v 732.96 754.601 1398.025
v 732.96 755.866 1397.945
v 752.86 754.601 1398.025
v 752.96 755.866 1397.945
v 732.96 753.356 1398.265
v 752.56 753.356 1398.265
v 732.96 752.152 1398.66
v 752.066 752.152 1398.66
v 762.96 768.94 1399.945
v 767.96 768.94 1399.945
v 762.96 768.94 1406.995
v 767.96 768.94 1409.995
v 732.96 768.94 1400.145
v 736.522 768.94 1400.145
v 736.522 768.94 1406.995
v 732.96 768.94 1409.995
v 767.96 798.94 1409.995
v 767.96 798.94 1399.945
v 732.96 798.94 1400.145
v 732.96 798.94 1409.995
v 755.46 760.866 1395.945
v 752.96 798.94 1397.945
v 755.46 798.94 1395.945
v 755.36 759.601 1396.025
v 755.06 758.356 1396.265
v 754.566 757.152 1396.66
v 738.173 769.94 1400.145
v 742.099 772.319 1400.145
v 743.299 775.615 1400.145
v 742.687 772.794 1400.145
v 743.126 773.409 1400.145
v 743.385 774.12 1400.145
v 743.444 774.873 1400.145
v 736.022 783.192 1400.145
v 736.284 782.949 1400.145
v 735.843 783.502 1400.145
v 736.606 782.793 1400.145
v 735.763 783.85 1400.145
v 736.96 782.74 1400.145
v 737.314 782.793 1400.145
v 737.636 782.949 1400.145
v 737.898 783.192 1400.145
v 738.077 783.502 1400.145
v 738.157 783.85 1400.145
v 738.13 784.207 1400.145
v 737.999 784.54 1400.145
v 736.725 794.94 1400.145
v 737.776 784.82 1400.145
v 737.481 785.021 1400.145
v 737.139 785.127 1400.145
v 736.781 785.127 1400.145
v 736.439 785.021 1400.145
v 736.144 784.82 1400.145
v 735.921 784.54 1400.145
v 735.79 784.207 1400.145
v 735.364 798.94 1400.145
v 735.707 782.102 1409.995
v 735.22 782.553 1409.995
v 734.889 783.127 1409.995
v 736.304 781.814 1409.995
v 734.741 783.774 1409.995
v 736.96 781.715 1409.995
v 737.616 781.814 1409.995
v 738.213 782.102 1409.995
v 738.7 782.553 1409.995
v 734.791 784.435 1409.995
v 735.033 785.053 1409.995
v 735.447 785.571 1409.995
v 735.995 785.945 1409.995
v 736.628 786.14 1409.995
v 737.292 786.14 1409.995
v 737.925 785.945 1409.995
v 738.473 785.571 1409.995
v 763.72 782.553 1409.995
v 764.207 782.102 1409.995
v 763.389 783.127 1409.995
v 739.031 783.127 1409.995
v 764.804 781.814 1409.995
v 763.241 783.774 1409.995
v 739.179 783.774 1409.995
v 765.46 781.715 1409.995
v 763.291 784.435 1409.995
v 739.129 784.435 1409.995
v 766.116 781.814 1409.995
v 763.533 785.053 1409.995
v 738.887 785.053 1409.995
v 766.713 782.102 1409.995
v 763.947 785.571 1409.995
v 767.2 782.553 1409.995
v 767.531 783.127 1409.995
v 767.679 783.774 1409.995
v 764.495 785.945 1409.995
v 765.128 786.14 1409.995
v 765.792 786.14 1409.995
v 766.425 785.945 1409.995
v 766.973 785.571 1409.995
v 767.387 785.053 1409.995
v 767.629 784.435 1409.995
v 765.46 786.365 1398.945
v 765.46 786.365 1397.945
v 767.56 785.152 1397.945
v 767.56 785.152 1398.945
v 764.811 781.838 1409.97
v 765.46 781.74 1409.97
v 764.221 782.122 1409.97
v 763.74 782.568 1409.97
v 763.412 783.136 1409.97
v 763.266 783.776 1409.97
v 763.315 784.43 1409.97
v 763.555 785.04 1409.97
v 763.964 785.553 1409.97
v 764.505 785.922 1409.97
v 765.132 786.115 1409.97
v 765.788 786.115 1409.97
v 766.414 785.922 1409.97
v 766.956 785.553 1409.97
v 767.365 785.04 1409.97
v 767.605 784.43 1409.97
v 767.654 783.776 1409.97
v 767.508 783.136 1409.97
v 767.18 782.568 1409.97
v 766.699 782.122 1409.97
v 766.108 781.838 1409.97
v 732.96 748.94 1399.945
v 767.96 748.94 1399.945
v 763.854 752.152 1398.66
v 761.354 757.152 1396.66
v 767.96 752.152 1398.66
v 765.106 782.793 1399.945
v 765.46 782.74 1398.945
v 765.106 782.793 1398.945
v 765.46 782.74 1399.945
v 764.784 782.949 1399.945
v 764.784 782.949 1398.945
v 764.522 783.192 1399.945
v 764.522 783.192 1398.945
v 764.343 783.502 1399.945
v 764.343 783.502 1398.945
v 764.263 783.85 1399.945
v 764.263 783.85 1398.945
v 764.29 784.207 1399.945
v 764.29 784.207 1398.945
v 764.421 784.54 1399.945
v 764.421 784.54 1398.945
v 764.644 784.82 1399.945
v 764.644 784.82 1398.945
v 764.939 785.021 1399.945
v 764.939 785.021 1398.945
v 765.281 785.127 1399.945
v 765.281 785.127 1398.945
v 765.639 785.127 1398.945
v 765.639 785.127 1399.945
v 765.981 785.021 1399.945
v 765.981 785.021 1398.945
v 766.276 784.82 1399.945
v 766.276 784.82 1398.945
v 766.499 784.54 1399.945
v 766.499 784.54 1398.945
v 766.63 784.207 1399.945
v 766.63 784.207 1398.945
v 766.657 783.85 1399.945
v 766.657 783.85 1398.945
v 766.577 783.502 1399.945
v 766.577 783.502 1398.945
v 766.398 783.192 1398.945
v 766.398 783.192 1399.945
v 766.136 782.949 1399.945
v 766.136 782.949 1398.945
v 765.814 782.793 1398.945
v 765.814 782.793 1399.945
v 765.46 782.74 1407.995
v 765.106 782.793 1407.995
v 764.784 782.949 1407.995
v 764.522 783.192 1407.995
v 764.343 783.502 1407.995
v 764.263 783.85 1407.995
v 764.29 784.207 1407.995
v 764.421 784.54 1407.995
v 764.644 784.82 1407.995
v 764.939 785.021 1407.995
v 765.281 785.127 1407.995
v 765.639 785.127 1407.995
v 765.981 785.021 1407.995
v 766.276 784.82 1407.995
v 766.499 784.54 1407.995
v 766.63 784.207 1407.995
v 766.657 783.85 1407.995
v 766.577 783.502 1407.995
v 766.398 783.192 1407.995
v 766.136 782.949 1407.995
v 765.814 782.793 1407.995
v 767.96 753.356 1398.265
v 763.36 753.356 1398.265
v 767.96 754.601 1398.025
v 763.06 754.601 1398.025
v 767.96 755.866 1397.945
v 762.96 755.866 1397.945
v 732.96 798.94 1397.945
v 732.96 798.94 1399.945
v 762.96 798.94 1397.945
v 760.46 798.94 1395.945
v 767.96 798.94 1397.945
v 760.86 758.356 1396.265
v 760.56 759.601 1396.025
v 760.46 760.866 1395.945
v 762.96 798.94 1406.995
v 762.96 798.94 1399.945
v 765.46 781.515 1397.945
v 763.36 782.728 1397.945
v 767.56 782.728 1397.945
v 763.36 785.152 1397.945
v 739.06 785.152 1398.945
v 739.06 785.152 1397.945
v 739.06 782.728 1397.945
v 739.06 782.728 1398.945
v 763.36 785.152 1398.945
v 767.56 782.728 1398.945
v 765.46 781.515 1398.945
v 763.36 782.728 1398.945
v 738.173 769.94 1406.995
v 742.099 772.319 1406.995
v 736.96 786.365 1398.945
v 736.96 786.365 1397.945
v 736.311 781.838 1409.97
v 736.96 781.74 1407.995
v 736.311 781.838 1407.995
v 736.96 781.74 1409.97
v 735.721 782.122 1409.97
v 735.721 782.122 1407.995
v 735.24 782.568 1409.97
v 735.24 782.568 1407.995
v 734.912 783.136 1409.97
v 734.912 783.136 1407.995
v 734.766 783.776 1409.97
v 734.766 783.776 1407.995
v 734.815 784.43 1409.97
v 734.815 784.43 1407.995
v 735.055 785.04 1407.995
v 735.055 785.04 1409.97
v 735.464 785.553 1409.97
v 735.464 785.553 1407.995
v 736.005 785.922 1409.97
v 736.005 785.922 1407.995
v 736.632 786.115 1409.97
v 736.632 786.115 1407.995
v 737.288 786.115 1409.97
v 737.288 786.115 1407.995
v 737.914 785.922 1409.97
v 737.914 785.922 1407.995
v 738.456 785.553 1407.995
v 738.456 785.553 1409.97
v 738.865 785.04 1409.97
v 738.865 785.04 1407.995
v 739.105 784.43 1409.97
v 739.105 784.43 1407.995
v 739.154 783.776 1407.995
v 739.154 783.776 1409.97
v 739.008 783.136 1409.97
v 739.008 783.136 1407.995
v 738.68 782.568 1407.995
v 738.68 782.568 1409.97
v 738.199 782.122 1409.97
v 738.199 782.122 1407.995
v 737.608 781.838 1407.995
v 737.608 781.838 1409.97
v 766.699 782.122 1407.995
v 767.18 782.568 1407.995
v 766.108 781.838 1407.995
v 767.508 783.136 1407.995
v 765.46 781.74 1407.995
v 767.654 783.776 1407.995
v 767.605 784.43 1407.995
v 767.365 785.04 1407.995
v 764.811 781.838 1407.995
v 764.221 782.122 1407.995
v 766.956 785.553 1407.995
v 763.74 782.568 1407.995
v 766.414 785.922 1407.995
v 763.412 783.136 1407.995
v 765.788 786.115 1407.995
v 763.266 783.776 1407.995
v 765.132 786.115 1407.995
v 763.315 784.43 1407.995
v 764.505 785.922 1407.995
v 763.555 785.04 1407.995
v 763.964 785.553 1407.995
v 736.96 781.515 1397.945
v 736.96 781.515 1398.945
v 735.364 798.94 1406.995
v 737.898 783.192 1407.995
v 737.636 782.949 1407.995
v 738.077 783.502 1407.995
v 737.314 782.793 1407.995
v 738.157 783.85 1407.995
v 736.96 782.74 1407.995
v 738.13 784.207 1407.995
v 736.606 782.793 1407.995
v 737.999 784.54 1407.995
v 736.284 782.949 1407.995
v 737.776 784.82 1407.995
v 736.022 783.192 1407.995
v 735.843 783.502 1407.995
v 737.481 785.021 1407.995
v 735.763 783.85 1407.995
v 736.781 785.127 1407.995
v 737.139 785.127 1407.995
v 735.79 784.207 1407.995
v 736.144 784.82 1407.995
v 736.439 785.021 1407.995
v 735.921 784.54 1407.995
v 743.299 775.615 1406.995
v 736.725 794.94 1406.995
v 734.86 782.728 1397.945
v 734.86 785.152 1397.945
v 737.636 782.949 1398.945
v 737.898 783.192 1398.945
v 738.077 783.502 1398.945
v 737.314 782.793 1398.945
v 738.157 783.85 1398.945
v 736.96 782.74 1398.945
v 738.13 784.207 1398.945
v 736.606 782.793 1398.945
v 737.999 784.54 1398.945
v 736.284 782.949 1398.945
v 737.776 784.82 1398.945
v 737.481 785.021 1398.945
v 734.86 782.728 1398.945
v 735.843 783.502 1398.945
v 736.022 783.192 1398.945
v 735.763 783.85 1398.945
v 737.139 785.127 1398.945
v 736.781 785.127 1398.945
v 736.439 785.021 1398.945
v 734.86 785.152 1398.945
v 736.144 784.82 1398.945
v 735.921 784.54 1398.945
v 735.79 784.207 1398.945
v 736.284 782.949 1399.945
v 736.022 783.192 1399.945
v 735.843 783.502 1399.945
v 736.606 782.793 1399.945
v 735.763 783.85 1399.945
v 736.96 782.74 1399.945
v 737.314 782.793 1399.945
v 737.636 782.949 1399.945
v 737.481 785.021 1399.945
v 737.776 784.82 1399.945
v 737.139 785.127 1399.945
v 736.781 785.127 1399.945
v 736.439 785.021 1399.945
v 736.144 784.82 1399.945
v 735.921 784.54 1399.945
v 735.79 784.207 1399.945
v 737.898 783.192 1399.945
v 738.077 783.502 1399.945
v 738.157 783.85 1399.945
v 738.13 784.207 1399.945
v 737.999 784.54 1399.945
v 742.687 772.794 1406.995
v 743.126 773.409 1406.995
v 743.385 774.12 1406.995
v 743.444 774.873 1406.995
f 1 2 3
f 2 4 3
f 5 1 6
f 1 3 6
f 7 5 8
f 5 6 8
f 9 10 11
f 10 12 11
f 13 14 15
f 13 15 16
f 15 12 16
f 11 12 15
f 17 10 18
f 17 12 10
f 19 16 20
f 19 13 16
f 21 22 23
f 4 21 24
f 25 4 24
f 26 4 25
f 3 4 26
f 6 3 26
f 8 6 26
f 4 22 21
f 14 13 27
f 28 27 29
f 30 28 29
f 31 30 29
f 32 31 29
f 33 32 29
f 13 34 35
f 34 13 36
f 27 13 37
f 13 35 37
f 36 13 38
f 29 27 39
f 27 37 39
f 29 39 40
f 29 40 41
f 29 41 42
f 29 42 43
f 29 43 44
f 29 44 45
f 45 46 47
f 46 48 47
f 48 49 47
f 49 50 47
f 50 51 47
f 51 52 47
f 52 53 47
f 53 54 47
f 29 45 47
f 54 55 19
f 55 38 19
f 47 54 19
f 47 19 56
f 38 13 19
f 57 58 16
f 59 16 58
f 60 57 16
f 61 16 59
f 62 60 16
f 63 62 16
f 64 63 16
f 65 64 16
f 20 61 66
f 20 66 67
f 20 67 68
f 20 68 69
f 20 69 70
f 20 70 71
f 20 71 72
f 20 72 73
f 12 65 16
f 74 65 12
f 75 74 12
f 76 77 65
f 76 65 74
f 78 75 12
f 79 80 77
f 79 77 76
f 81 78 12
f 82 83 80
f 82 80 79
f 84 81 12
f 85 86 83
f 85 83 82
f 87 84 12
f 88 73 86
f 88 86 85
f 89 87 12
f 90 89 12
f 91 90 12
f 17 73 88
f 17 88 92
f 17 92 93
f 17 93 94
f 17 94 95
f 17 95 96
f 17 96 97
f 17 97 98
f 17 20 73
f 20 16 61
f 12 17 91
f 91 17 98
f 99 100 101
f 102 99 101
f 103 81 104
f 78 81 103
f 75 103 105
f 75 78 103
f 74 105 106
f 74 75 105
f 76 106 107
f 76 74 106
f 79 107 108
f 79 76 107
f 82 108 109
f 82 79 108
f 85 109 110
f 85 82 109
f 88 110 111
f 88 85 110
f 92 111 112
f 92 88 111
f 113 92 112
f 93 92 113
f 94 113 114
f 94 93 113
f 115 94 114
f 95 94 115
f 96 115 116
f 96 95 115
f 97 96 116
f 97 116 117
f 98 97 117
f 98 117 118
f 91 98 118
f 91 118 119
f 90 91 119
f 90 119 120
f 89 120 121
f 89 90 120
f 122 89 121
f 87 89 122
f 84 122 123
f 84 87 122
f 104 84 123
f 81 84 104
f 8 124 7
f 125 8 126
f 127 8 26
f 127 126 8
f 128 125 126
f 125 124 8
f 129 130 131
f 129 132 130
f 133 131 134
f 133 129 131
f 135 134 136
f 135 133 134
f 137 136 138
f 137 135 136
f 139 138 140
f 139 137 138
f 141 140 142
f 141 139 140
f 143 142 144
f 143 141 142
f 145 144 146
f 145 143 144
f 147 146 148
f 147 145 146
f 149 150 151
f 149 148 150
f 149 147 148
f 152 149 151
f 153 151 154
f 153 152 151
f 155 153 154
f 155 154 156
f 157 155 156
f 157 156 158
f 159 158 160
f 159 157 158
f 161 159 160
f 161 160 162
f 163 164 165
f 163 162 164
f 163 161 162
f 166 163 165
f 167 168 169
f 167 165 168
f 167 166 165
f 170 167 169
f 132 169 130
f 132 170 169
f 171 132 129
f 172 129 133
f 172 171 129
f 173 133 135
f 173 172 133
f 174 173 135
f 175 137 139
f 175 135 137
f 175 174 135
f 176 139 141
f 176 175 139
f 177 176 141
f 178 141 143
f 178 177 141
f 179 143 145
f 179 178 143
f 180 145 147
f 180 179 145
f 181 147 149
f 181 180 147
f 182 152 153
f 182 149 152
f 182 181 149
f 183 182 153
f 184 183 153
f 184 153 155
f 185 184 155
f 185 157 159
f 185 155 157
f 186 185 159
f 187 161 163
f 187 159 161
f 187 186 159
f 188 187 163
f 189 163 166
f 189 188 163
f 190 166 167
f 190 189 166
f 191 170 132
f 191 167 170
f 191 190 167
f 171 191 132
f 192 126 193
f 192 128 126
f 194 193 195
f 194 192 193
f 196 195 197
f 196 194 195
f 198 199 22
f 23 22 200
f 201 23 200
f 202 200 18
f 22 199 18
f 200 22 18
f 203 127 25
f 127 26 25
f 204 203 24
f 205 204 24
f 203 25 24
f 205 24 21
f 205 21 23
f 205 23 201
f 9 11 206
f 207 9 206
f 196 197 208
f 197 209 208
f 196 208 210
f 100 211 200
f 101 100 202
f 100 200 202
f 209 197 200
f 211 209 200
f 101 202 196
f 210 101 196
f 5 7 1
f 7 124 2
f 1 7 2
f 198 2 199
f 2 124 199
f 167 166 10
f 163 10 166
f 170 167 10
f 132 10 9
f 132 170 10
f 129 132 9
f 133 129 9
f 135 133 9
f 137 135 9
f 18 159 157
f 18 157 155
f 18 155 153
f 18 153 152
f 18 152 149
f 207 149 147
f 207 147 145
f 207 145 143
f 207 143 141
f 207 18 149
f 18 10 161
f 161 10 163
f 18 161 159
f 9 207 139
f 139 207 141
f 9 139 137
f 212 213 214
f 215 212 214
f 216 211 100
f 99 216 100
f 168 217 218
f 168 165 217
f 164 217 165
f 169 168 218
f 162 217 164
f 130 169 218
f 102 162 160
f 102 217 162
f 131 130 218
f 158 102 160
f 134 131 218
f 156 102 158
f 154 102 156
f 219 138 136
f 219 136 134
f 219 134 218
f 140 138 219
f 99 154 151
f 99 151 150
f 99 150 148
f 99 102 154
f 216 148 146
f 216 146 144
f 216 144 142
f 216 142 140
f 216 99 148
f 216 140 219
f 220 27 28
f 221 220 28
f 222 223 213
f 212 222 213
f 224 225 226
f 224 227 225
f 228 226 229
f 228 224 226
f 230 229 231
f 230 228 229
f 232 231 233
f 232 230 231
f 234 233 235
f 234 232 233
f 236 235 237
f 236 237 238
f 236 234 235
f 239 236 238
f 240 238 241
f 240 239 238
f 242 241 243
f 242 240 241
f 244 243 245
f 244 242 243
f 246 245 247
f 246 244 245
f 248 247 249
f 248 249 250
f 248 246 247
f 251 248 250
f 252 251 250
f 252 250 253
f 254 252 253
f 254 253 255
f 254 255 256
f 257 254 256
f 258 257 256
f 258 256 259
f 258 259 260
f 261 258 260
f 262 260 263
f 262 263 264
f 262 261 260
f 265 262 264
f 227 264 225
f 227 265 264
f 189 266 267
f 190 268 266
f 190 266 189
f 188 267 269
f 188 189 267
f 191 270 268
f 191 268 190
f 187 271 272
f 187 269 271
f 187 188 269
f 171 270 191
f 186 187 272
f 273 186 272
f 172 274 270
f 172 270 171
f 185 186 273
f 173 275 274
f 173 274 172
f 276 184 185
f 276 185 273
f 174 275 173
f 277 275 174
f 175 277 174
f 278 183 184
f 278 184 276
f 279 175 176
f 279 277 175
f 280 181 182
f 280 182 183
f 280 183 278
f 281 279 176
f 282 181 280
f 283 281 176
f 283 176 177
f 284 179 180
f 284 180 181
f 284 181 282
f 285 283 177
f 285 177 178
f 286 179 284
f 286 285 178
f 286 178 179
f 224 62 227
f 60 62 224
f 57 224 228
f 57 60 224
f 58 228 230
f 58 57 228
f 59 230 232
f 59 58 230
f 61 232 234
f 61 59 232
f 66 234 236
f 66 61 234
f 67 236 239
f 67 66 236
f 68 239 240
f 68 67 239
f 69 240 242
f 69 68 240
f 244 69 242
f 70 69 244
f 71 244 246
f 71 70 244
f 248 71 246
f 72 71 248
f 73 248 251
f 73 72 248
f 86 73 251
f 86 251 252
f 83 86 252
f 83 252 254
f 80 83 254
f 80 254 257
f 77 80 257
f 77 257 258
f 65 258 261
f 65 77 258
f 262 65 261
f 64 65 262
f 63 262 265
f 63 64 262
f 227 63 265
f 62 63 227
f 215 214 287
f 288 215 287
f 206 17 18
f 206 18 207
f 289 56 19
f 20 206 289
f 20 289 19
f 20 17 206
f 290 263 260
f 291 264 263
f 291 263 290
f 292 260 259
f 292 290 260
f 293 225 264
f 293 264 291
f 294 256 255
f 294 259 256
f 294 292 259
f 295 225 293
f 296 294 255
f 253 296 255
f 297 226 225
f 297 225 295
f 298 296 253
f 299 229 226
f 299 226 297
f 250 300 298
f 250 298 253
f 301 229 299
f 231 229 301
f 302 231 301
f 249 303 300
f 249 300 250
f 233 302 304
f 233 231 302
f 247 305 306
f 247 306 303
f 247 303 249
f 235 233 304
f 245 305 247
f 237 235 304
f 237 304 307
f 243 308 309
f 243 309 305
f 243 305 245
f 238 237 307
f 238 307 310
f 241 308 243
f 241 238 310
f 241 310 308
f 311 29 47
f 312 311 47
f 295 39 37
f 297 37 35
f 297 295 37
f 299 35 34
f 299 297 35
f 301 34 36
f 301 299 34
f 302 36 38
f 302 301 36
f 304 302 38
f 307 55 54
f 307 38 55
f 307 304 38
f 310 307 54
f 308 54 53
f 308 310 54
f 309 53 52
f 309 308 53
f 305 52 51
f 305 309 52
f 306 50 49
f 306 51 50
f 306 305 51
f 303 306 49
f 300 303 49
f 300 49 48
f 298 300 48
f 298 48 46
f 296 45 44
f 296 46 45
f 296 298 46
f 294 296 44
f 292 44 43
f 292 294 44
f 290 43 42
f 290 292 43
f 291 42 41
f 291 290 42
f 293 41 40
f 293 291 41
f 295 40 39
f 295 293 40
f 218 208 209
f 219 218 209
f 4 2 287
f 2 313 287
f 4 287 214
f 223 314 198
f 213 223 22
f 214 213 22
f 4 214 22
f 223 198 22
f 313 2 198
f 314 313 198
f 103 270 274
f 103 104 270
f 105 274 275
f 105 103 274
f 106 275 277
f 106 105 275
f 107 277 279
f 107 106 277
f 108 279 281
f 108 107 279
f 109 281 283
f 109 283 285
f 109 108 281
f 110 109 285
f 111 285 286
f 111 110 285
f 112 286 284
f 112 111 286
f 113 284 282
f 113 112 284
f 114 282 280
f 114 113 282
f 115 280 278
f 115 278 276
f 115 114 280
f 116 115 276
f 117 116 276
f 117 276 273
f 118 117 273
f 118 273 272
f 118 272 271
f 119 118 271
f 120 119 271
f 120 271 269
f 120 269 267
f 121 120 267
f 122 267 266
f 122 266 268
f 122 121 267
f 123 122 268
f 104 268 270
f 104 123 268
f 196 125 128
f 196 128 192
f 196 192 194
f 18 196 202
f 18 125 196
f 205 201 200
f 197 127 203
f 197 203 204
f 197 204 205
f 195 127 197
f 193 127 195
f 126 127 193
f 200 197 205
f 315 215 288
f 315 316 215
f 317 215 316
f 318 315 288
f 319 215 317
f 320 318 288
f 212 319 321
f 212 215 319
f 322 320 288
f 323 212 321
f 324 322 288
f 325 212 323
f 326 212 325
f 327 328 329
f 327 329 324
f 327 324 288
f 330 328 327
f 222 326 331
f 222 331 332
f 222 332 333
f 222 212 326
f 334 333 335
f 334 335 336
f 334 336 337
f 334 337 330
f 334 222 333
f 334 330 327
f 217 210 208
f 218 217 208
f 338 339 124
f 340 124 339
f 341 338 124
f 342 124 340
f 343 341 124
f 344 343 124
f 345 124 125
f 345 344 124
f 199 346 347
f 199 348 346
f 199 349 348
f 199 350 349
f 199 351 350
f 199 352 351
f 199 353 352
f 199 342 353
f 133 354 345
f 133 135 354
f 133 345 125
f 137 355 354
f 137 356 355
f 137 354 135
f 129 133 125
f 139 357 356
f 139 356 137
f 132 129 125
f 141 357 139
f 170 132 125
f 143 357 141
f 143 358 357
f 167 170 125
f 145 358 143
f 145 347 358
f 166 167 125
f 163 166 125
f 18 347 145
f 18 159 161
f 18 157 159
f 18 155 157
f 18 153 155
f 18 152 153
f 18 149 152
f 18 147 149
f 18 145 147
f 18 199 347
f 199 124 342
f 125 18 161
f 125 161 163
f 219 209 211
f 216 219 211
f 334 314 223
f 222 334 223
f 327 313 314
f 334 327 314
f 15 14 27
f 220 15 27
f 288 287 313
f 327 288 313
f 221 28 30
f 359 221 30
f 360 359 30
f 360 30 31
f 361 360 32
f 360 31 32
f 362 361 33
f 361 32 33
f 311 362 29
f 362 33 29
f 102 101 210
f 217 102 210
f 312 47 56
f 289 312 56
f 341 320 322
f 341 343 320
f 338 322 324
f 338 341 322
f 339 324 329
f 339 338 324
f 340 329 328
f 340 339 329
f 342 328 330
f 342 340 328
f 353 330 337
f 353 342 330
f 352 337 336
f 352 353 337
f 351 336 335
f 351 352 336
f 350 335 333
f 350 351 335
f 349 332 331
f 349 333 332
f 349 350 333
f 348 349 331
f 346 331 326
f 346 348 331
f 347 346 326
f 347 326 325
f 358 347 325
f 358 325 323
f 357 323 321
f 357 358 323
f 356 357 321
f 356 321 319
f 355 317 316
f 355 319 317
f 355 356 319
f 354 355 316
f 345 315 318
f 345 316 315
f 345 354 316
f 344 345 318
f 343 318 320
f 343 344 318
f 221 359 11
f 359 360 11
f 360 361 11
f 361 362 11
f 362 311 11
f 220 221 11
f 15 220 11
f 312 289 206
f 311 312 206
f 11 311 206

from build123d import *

# Parameters (mm, degrees)
BOSS_EXTRUDE2_START           = -0.2
SKETCH1_W                     = 35
SKETCH1_H                     = 50
BOSS_EXTRUDE2_DEPTH           = 2
BOSS_EXTRUDE3_DEPTH           = 6.85
BOSS_EXTRUDE4_DEPTH           = 50
SKETCH3_W                     = 35
SKETCH3_H                     = 30
BOSS_EXTRUDE5_DEPTH           = 3
SKETCH4_W                     = 5
SKETCH4_H                     = 30
BOSS_EXTRUDE6_DEPTH           = 7.05
CBORE_FOR_M2_SHCS1_AT_2_COUNT = 2
CBORE_FOR_M2_SHCS1_AT_2_PITCH = 28.5
CUT_EXTRUDE1_DEPTH            = 1
CUT_EXTRUDE2_DEPTH            = 1621.991940329
FILLET1_R                     = 10


with BuildPart() as part:
    # Sketch1 → Boss-Extrude2 (new body)
    with BuildSketch(Plane.XY.offset(1400.144561134).offset(BOSS_EXTRUDE2_START)):
        with Locations((750.459950432, 773.940052935)):
            Rectangle(SKETCH1_W, SKETCH1_H)
    extrude(amount=-BOSS_EXTRUDE2_DEPTH)

    # Sketch2 → Boss-Extrude4 (add)
    with BuildSketch(Plane.XZ.offset(-748.940052935)):
        Polygon((752.959950432, 1397.944561134), (755.459950432, 1395.944561134), (760.459950432, 1395.944561134), (762.959950432, 1397.944561134), align=None)
    extrude(amount=-BOSS_EXTRUDE4_DEPTH)


with BuildPart() as body_2:
    # Sketch1<4> → Boss-Extrude3 (new body)
    with BuildSketch(Plane.XY.offset(1400.144561134)):
        with BuildLine():
            Line((732.959950432, 798.940052935), (732.959950432, 768.940052935))
            Line((732.959950432, 768.940052935), (736.521730144, 768.940052935))
            Line((736.521730144, 768.940052935), (738.1725657, 769.940052935))
            Line((738.1725657, 769.940052935), (742.099132051, 772.318585634))
            ThreePointArc((742.099132051, 772.318585634), (743.279516949, 773.755679726), (743.299218285, 775.615292533))
            Line((743.299218285, 775.615292533), (736.724735191, 794.940052935))
            Line((736.724735191, 794.940052935), (735.363893875, 798.940052935))
            Line((735.363893875, 798.940052935), (732.959950432, 798.940052935))
        make_face()
    extrude(amount=BOSS_EXTRUDE3_DEPTH)

    # Sketch3 → Boss-Extrude5 (add)
    with BuildSketch(Plane.XY.offset(1406.994561134)):
        with Locations((750.459950432, 783.940052935)):
            Rectangle(SKETCH3_W, SKETCH3_H)
    extrude(amount=BOSS_EXTRUDE5_DEPTH)

    # Sketch4 → Boss-Extrude6 (add)
    with BuildSketch(Plane(origin=(0, 0, 1406.994561134), x_dir=(-1, 0, 0), z_dir=(0, 0, -1))):
        with Locations((-765.459950432, 783.940052935)):
            Rectangle(SKETCH4_W, SKETCH4_H)
    extrude(amount=BOSS_EXTRUDE6_DEPTH)


with BuildPart() as cbore_for_m2_shcs1_tool:
    # Sketch6 → CBORE for M2 SHCS1 (revolve)
    with BuildSketch(Plane(origin=(736.959950432, 783.940052935, 1409.994561134), x_dir=(0, -1, 0), z_dir=(1, 0, 0))):
        Polygon((0, 0), (0, 14.05), (1.2, 14.05), (1.2, 2), (2.2, 2), (2.2, 0.025), (2.225, 0), align=None)
    cbore_for_m2_shcs1 = revolve(axis=Axis((736.959950432, 783.940052935, 1416.344561134), (0, 0, -1)))


with BuildPart() as part_1:
    add(part.part)

    # CBORE for M2 SHCS1: cut by cbore_for_m2_shcs1_tool
    add(cbore_for_m2_shcs1_tool.part, mode=Mode.SUBTRACT)


with BuildPart() as body_2_1:
    add(body_2.part)

    # CBORE for M2 SHCS1: cut by cbore_for_m2_shcs1_tool
    add(cbore_for_m2_shcs1_tool.part, mode=Mode.SUBTRACT)


with BuildPart() as cbore_for_m2_shcs1_at_2_tool:
    # CBORE for M2 SHCS1 at 2: CBORE for M2 SHCS1 ×2
    with Locations(*[(i * CBORE_FOR_M2_SHCS1_AT_2_PITCH, 0, 0) for i in range(1, CBORE_FOR_M2_SHCS1_AT_2_COUNT)]):
        add(cbore_for_m2_shcs1)


with BuildPart() as part_2:
    add(part_1.part)

    # CBORE for M2 SHCS1 at 2: cut by cbore_for_m2_shcs1_at_2_tool
    add(cbore_for_m2_shcs1_at_2_tool.part, mode=Mode.SUBTRACT)

    # Sketch7 → Cut-Extrude1 (cut)
    with BuildSketch(Plane(origin=(0, 0, 1397.944561134), x_dir=(-1, 0, 0), z_dir=(0, 0, -1))):
        Polygon((-763.359950432, 785.152488501), (-765.459950432, 786.364924066), (-767.559950432, 785.152488501), (-767.559950432, 782.72761737), (-765.459950432, 781.515181805), (-763.359950432, 782.72761737), align=None)
        Polygon((-734.859950432, 785.152488501), (-736.959950432, 786.364924066), (-739.059950432, 785.152488501), (-739.059950432, 782.72761737), (-736.959950432, 781.515181805), (-734.859950432, 782.72761737), align=None)
    extrude(amount=-CUT_EXTRUDE1_DEPTH, mode=Mode.SUBTRACT)

    # Sketch8 → Cut-Extrude2 (cut, through all)
    with BuildSketch(Plane(origin=(767.959950432, 0, 0), x_dir=(0, 0, -1), z_dir=(1, 0, 0))):
        Polygon((-1399.944561134, 748.940052935), (-1395.944561134, 758.940052935), (-1395.944561134, 748.940052935), align=None)
    extrude(amount=-CUT_EXTRUDE2_DEPTH, mode=Mode.SUBTRACT)

    # Fillet1
    fillet1_edges = [part_2.edges().sort_by_distance(p)[0] for p in [
        (742.959950432, 753.940052935, 1397.944561134),
        (765.459950432, 753.940052935, 1397.944561134),
        (757.959950432, 758.940052935, 1395.944561134),
    ]]
    fillet(fillet1_edges, radius=FILLET1_R)


with BuildPart() as body_2_2:
    add(body_2_1.part)

    # CBORE for M2 SHCS1 at 2: cut by cbore_for_m2_shcs1_at_2_tool
    add(cbore_for_m2_shcs1_at_2_tool.part, mode=Mode.SUBTRACT)


solid = Compound([part_2.part, body_2_2.part])
